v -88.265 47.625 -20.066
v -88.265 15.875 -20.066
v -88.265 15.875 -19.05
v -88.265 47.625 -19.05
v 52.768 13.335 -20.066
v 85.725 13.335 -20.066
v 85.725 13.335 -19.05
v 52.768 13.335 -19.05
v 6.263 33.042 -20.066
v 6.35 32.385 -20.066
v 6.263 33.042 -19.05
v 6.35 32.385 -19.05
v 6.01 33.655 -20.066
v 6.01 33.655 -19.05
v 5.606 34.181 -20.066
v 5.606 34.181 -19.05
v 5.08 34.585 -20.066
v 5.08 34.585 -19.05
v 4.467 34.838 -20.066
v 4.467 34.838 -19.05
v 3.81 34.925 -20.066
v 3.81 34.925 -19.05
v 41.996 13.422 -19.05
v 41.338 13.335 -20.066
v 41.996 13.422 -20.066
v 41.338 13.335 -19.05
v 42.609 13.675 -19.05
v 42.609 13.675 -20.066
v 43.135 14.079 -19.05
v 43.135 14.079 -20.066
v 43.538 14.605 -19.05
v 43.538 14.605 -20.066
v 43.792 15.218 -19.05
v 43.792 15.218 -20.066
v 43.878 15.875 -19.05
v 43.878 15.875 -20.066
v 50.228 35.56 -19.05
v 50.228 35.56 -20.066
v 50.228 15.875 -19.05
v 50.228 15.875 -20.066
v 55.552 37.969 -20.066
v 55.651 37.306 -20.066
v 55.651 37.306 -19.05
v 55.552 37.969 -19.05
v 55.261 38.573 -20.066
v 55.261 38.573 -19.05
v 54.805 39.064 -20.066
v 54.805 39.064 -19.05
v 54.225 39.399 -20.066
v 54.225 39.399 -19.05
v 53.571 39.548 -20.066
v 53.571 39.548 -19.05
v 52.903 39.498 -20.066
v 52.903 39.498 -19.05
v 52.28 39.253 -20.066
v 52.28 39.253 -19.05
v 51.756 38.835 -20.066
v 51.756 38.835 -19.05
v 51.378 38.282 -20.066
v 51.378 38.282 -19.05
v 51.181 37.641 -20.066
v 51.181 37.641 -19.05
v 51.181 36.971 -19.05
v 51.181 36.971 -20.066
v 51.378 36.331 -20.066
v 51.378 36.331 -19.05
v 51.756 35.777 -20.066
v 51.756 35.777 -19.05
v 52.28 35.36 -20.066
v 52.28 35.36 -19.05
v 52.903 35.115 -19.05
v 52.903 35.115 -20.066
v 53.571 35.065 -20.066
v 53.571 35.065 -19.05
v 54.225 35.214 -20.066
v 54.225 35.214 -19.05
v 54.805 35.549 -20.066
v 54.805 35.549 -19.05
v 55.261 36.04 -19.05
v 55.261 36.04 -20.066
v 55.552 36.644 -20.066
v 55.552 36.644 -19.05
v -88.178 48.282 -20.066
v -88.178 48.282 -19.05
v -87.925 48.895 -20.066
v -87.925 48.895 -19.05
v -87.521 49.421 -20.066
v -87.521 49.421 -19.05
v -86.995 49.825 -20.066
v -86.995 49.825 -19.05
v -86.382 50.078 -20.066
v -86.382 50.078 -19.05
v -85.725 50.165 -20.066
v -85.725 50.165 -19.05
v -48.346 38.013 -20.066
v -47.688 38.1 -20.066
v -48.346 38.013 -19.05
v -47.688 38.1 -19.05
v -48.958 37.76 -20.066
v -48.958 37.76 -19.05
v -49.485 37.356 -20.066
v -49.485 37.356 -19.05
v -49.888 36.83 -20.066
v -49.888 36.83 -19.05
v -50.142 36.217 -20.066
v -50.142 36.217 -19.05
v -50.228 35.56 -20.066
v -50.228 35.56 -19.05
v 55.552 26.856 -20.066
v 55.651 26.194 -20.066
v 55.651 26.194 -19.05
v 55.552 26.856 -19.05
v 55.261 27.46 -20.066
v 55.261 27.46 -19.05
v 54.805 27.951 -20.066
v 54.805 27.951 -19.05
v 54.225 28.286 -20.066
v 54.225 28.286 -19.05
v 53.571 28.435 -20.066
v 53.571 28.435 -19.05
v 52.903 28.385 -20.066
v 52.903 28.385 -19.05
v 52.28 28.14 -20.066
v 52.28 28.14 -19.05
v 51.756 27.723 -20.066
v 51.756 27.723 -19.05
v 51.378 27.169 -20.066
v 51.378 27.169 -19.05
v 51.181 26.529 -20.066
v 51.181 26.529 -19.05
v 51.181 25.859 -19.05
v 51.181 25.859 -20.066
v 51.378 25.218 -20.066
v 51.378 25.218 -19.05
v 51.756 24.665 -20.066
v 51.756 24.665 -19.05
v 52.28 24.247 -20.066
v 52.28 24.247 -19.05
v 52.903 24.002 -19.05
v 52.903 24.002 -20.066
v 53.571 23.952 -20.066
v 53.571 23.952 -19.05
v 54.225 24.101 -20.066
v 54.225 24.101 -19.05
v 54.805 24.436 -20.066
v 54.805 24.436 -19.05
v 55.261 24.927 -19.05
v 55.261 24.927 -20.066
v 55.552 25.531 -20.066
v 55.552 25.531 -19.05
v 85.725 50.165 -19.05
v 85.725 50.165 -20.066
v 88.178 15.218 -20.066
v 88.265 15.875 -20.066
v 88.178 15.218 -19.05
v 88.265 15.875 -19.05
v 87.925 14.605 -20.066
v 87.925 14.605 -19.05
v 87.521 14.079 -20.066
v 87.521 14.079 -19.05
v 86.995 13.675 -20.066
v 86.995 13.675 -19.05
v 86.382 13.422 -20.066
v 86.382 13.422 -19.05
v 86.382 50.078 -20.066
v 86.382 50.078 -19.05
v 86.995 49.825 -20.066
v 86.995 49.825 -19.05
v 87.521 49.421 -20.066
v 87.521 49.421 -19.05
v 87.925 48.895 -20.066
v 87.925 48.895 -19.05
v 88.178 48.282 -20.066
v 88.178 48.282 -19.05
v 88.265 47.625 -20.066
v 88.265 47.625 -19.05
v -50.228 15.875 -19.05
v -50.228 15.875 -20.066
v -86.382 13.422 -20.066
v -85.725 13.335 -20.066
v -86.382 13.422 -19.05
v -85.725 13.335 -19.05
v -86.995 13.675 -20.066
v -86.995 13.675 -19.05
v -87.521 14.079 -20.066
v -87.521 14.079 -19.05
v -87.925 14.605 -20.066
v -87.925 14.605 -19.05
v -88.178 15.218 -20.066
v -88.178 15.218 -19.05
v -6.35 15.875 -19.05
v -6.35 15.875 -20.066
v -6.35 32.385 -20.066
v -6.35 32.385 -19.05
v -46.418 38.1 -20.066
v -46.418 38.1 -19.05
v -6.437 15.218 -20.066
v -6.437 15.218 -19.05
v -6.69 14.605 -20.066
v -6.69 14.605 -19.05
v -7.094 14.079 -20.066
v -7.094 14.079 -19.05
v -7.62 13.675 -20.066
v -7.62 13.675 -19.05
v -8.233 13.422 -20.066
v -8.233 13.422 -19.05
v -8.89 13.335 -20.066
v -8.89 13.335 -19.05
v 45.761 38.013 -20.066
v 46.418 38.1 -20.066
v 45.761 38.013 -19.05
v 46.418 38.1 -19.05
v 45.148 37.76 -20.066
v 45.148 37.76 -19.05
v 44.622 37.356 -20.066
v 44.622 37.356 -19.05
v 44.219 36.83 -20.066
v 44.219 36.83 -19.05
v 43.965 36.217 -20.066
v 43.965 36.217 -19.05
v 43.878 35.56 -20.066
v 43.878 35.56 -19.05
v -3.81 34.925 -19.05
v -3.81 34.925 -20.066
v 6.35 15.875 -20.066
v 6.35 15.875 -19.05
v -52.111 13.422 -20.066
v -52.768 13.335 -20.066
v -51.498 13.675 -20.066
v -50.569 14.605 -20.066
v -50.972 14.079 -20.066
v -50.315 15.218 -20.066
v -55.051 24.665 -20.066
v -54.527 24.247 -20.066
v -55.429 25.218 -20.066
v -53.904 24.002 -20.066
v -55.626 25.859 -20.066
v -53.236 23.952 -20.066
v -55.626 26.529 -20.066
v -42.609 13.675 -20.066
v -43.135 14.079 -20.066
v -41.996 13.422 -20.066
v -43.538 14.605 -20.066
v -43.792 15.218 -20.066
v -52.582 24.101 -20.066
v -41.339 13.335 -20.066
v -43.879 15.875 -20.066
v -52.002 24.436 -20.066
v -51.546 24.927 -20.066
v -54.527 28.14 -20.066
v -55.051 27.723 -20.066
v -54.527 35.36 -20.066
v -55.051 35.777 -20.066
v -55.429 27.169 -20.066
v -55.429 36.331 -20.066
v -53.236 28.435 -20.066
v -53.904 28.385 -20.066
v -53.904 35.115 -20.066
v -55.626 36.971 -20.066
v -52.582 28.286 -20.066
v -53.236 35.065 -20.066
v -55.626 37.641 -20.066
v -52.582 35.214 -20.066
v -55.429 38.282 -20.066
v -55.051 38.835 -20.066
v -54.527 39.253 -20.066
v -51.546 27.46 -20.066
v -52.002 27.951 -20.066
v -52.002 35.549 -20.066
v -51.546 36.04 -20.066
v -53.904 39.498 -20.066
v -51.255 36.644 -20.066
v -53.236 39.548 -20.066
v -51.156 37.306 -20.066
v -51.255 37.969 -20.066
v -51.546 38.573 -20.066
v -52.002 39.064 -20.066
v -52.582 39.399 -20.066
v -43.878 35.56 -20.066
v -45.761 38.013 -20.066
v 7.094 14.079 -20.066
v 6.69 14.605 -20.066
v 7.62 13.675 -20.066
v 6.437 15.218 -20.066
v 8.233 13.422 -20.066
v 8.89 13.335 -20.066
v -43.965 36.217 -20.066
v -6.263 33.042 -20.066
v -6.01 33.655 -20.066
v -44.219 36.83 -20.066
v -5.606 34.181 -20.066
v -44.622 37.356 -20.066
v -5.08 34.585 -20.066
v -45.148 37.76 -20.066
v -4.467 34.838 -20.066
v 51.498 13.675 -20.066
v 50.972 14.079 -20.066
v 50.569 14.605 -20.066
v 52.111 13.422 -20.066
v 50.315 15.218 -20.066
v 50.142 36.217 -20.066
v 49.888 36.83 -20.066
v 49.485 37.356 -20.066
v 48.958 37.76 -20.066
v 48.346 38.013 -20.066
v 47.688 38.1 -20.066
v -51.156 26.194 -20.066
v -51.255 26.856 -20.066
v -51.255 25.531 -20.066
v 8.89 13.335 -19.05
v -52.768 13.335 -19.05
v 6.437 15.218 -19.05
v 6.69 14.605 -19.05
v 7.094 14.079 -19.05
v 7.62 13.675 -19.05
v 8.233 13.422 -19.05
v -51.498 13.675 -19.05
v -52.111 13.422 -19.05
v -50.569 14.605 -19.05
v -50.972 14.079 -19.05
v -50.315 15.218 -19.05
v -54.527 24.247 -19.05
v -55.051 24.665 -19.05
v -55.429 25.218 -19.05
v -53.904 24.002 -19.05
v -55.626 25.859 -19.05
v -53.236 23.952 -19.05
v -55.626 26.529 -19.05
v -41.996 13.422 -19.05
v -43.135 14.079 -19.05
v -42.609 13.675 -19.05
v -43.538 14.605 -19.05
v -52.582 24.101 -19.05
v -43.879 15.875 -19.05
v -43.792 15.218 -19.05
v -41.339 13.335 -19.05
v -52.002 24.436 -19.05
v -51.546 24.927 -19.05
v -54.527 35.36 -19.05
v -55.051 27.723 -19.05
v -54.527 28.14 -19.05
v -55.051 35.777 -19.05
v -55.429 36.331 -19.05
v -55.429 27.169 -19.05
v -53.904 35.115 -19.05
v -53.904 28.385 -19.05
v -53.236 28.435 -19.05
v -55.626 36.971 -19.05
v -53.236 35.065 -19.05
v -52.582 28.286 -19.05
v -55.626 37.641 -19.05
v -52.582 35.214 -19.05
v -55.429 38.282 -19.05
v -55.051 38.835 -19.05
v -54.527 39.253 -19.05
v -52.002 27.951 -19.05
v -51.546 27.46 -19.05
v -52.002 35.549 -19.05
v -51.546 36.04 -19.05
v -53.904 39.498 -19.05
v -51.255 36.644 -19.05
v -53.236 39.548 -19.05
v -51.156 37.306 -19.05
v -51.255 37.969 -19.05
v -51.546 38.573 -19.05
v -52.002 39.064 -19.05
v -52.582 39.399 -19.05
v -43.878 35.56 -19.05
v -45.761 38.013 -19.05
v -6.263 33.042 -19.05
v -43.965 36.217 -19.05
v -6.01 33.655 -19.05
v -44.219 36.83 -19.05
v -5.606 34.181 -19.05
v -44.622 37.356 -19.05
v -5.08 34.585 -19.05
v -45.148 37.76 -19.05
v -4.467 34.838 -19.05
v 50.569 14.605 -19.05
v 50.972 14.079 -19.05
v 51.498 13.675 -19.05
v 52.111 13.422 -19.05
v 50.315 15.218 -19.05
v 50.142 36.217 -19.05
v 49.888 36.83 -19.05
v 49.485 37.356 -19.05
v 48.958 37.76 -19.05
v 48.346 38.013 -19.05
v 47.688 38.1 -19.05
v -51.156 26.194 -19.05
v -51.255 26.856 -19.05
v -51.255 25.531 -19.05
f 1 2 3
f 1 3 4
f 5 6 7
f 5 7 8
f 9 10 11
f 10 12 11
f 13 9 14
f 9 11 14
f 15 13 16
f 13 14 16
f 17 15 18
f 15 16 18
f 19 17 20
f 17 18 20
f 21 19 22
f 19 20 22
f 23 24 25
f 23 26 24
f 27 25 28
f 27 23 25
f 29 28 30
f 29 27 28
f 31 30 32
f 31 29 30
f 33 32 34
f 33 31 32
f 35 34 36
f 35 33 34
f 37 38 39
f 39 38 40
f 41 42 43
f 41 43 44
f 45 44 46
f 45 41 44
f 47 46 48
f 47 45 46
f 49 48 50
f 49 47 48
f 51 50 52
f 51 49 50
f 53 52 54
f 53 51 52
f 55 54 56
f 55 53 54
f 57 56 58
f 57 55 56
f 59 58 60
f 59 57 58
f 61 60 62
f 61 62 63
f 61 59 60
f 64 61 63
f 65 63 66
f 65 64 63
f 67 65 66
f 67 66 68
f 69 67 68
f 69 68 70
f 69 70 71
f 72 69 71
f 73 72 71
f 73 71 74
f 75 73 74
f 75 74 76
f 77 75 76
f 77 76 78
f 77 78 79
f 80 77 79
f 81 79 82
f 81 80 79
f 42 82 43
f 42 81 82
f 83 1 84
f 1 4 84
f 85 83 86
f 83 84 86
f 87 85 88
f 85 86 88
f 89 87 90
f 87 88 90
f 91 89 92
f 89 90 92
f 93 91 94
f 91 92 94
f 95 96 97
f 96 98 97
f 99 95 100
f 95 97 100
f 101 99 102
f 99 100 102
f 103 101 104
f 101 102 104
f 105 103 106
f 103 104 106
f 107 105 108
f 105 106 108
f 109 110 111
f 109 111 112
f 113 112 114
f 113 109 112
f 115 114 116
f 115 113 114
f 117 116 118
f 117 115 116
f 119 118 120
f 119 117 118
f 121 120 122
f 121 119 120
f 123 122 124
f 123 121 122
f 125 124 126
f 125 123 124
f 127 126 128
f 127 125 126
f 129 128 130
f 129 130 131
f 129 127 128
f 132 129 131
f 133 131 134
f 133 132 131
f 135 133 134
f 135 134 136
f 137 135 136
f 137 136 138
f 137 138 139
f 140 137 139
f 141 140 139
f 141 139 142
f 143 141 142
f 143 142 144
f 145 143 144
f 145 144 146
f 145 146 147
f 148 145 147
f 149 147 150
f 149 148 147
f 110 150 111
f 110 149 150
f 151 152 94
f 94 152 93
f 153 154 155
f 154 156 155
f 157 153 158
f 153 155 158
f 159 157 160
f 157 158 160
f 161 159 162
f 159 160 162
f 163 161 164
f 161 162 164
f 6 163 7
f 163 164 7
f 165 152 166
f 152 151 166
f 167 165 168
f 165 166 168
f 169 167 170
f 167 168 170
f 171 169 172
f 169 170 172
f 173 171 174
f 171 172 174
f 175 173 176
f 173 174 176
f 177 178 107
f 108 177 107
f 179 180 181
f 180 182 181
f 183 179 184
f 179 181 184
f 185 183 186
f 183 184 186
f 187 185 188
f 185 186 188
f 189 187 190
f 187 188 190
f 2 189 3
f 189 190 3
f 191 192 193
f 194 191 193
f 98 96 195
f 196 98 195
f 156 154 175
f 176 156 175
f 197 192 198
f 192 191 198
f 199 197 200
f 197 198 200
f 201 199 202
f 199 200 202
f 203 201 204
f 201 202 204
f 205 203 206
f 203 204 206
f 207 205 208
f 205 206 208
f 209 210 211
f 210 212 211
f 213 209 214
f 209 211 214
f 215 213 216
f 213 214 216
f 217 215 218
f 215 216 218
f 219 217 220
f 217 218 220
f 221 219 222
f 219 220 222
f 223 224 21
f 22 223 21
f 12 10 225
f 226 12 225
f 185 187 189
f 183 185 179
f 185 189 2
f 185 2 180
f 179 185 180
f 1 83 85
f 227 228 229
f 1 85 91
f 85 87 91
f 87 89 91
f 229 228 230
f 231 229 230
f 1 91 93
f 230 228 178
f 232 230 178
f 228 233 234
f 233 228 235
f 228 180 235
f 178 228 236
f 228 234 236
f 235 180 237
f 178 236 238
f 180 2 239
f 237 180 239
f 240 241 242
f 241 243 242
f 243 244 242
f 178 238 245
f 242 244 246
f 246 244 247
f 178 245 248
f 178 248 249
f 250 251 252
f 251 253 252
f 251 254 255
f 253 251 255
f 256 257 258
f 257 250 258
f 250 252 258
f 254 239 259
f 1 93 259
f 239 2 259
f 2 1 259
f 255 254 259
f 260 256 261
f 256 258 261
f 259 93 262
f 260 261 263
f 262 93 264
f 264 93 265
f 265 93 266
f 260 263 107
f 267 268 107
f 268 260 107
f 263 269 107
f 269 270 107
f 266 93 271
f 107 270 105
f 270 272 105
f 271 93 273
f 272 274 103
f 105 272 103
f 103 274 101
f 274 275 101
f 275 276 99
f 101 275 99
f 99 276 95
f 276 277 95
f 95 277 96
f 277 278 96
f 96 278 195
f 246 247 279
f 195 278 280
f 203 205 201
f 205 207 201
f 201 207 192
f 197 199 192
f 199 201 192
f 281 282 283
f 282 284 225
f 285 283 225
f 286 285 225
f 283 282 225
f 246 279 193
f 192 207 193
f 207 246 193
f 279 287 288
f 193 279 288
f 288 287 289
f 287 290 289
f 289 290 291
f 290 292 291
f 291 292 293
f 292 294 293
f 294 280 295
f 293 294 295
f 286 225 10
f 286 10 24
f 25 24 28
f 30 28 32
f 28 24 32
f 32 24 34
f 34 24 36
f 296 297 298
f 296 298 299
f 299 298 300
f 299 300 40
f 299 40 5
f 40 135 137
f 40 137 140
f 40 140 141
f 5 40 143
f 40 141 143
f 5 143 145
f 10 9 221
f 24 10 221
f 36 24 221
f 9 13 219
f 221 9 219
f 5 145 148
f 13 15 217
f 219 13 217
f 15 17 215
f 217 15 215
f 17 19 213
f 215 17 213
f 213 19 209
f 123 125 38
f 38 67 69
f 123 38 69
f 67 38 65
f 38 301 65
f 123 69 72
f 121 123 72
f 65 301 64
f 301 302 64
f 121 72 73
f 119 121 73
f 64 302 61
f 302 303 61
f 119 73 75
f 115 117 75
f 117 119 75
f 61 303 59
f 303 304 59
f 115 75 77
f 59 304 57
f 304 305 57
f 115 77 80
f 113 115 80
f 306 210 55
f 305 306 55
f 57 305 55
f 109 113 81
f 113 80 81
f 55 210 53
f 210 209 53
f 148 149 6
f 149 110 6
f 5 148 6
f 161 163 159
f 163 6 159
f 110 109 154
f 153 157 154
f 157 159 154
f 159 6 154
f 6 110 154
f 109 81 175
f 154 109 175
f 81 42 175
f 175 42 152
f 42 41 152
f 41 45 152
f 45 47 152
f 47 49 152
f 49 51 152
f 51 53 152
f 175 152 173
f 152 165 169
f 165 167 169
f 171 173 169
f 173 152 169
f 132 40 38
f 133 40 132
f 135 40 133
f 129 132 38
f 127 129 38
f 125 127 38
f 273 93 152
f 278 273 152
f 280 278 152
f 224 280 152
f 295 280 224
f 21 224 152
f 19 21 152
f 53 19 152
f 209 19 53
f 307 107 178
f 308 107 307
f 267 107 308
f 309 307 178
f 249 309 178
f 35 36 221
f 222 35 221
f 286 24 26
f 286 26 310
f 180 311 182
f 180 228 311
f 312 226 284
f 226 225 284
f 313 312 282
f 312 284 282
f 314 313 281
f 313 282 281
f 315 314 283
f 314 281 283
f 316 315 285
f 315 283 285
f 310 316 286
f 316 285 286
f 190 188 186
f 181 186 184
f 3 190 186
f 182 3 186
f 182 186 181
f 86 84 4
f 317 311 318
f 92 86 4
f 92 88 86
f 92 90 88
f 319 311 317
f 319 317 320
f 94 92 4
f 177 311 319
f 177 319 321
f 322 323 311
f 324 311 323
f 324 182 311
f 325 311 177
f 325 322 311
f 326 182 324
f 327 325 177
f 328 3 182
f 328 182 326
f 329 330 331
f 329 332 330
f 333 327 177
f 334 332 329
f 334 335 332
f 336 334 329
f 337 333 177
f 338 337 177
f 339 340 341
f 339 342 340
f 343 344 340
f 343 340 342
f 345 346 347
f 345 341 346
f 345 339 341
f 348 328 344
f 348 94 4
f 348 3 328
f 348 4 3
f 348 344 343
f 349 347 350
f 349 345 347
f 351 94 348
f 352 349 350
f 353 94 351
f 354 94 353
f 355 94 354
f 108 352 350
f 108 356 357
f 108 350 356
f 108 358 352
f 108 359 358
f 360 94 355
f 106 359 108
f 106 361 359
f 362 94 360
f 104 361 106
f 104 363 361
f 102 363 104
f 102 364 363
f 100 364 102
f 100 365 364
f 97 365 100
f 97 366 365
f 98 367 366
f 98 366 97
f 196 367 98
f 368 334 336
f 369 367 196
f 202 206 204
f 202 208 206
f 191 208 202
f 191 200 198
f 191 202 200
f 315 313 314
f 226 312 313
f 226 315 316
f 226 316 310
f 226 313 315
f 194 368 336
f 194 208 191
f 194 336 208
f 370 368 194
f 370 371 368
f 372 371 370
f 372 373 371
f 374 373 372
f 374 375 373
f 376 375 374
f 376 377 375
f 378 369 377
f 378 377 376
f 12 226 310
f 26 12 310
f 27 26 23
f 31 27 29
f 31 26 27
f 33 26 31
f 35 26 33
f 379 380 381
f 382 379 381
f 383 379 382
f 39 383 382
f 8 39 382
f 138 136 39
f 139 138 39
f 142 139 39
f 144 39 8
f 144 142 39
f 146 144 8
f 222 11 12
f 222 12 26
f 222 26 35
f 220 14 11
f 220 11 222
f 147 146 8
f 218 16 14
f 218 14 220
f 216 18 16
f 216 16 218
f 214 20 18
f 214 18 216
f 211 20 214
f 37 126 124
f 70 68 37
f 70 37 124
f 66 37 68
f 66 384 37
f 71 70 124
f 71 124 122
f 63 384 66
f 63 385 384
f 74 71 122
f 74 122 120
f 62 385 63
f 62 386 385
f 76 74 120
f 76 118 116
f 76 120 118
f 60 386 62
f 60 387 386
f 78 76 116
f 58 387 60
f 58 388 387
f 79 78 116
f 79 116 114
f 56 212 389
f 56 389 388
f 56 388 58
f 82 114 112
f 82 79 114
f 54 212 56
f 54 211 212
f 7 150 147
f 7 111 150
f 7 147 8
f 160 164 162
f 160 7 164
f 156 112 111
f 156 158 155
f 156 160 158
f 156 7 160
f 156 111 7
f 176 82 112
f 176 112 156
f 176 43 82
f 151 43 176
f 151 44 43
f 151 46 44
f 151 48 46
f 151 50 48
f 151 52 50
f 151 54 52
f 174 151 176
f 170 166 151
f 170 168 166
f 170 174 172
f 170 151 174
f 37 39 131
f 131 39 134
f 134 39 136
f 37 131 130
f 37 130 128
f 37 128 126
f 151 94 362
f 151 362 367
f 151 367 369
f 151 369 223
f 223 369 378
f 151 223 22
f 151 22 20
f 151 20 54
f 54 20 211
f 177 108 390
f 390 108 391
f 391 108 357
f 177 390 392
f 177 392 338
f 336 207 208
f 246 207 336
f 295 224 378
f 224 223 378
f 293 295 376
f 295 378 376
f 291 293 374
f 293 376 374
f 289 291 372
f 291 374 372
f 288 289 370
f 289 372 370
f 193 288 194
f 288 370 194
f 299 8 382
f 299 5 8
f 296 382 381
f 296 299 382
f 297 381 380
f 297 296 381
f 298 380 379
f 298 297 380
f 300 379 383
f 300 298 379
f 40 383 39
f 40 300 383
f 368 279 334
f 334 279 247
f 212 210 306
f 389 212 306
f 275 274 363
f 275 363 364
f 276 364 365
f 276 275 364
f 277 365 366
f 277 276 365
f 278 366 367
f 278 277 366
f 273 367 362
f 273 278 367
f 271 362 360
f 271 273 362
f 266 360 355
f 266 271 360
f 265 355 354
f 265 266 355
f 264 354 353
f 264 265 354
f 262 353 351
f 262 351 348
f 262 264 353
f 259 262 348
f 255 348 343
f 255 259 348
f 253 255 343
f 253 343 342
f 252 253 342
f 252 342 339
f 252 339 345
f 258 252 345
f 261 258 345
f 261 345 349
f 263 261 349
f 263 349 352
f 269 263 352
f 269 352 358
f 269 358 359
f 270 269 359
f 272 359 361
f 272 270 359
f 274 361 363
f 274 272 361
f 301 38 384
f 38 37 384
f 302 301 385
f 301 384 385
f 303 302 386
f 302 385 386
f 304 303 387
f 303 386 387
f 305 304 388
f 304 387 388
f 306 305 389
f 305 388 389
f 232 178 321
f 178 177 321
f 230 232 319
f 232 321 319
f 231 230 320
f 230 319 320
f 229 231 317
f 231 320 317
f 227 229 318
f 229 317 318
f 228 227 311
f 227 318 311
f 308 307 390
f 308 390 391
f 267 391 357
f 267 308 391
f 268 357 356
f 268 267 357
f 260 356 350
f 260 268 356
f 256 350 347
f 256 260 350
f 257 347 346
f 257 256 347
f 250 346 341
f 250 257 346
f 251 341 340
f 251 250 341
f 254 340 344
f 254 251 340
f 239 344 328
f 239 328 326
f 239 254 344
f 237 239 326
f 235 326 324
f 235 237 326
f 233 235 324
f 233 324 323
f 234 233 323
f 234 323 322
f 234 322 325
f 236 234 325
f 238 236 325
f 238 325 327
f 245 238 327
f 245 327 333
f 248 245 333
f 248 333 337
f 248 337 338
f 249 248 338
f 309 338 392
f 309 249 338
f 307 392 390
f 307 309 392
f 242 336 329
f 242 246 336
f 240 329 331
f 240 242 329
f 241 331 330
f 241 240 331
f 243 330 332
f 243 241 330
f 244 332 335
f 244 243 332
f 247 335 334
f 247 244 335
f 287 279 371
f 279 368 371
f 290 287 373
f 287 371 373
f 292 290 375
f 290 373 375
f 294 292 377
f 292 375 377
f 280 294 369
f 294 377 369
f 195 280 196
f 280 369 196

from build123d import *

# Parameters (mm, degrees)
STOCK_HAMMERSAW_START                 = -20.066
STOCK_HAMMERSAW_MULTIBODY_1_OUTLINE_R = 2.2479
STOCK_HAMMERSAW_MULTIBODY_1_DEPTH     = 1.016
SKETCH1_W                             = 177.8
SKETCH1_H                             = 38.1
SKETCH1_W_2                           = 176.53
SKETCH1_H_2                           = 36.83
CUT_EXTRUDE1_DEPTH                    = 103.395714051
FILLET1_R                             = 2.54


# Read off the part's stored shape, not the designer's step: Stock-HammerSaw Multibody-1
with BuildPart() as part:
    # Stock-HammerSaw Multibody-1 outline → Stock-HammerSaw Multibody-1 (new body)
    with BuildSketch(Plane.XY.offset(STOCK_HAMMERSAW_START)):
        Polygon((6.35, 12.7), (43.8785, 12.7), (43.8785, 38.1), (50.2285, 38.1), (50.2285, 12.7), (88.9, 12.7), (88.9, 50.8), (-88.9, 50.8), (-88.9, 12.7), (-50.2285, 12.7), (-50.2285, 38.1), (-43.8785, 38.1), (-43.8785, 12.7), (-6.35, 12.7), (-6.35, 34.925), (6.35, 34.925), align=None)
        with Locations((-53.4035, 26.19375)):
            Circle(STOCK_HAMMERSAW_MULTIBODY_1_OUTLINE_R, mode=Mode.SUBTRACT)
        with Locations((53.4035, 26.19375)):
            Circle(STOCK_HAMMERSAW_MULTIBODY_1_OUTLINE_R, mode=Mode.SUBTRACT)
        with Locations((-53.4035, 37.30625)):
            Circle(STOCK_HAMMERSAW_MULTIBODY_1_OUTLINE_R, mode=Mode.SUBTRACT)
        with Locations((53.4035, 37.30625)):
            Circle(STOCK_HAMMERSAW_MULTIBODY_1_OUTLINE_R, mode=Mode.SUBTRACT)
    extrude(amount=STOCK_HAMMERSAW_MULTIBODY_1_DEPTH)

    # Sketch1 → Cut-Extrude1 (cut, through all)
    with BuildSketch(Plane(origin=(0, 0, -20.066), x_dir=(-1, 0, 0), z_dir=(0, 0, -1))):
        with Locations((0, 31.75)):
            Rectangle(SKETCH1_W, SKETCH1_H)
        with Locations((0, 31.75)):
            Rectangle(SKETCH1_W_2, SKETCH1_H_2, mode=Mode.SUBTRACT)
    extrude(amount=-CUT_EXTRUDE1_DEPTH, mode=Mode.SUBTRACT)

    # Fillet1
    fillet1_edges = [part.edges().sort_by_distance(p)[0] for p in [
        (-6.35, 13.335, -19.558),
        (88.265, 13.335, -19.558),
        (50.2285, 13.335, -19.558),
        (43.8785, 13.335, -19.558),
        (-50.2285, 13.335, -19.558),
        (-43.8785, 13.335, -19.558),
        (-88.265, 50.165, -19.558),
        (-88.265, 13.335, -19.558),
        (6.35, 13.335, -19.558),
        (88.265, 50.165, -19.558),
        (6.35, 34.925, -19.558),
        (-6.35, 34.925, -19.558),
        (-50.2285, 38.1, -19.558),
        (-43.8785, 38.1, -19.558),
        (50.2285, 38.1, -19.558),
        (43.8785, 38.1, -19.558),
    ]]
    fillet(fillet1_edges, radius=FILLET1_R)


solid = part.part
